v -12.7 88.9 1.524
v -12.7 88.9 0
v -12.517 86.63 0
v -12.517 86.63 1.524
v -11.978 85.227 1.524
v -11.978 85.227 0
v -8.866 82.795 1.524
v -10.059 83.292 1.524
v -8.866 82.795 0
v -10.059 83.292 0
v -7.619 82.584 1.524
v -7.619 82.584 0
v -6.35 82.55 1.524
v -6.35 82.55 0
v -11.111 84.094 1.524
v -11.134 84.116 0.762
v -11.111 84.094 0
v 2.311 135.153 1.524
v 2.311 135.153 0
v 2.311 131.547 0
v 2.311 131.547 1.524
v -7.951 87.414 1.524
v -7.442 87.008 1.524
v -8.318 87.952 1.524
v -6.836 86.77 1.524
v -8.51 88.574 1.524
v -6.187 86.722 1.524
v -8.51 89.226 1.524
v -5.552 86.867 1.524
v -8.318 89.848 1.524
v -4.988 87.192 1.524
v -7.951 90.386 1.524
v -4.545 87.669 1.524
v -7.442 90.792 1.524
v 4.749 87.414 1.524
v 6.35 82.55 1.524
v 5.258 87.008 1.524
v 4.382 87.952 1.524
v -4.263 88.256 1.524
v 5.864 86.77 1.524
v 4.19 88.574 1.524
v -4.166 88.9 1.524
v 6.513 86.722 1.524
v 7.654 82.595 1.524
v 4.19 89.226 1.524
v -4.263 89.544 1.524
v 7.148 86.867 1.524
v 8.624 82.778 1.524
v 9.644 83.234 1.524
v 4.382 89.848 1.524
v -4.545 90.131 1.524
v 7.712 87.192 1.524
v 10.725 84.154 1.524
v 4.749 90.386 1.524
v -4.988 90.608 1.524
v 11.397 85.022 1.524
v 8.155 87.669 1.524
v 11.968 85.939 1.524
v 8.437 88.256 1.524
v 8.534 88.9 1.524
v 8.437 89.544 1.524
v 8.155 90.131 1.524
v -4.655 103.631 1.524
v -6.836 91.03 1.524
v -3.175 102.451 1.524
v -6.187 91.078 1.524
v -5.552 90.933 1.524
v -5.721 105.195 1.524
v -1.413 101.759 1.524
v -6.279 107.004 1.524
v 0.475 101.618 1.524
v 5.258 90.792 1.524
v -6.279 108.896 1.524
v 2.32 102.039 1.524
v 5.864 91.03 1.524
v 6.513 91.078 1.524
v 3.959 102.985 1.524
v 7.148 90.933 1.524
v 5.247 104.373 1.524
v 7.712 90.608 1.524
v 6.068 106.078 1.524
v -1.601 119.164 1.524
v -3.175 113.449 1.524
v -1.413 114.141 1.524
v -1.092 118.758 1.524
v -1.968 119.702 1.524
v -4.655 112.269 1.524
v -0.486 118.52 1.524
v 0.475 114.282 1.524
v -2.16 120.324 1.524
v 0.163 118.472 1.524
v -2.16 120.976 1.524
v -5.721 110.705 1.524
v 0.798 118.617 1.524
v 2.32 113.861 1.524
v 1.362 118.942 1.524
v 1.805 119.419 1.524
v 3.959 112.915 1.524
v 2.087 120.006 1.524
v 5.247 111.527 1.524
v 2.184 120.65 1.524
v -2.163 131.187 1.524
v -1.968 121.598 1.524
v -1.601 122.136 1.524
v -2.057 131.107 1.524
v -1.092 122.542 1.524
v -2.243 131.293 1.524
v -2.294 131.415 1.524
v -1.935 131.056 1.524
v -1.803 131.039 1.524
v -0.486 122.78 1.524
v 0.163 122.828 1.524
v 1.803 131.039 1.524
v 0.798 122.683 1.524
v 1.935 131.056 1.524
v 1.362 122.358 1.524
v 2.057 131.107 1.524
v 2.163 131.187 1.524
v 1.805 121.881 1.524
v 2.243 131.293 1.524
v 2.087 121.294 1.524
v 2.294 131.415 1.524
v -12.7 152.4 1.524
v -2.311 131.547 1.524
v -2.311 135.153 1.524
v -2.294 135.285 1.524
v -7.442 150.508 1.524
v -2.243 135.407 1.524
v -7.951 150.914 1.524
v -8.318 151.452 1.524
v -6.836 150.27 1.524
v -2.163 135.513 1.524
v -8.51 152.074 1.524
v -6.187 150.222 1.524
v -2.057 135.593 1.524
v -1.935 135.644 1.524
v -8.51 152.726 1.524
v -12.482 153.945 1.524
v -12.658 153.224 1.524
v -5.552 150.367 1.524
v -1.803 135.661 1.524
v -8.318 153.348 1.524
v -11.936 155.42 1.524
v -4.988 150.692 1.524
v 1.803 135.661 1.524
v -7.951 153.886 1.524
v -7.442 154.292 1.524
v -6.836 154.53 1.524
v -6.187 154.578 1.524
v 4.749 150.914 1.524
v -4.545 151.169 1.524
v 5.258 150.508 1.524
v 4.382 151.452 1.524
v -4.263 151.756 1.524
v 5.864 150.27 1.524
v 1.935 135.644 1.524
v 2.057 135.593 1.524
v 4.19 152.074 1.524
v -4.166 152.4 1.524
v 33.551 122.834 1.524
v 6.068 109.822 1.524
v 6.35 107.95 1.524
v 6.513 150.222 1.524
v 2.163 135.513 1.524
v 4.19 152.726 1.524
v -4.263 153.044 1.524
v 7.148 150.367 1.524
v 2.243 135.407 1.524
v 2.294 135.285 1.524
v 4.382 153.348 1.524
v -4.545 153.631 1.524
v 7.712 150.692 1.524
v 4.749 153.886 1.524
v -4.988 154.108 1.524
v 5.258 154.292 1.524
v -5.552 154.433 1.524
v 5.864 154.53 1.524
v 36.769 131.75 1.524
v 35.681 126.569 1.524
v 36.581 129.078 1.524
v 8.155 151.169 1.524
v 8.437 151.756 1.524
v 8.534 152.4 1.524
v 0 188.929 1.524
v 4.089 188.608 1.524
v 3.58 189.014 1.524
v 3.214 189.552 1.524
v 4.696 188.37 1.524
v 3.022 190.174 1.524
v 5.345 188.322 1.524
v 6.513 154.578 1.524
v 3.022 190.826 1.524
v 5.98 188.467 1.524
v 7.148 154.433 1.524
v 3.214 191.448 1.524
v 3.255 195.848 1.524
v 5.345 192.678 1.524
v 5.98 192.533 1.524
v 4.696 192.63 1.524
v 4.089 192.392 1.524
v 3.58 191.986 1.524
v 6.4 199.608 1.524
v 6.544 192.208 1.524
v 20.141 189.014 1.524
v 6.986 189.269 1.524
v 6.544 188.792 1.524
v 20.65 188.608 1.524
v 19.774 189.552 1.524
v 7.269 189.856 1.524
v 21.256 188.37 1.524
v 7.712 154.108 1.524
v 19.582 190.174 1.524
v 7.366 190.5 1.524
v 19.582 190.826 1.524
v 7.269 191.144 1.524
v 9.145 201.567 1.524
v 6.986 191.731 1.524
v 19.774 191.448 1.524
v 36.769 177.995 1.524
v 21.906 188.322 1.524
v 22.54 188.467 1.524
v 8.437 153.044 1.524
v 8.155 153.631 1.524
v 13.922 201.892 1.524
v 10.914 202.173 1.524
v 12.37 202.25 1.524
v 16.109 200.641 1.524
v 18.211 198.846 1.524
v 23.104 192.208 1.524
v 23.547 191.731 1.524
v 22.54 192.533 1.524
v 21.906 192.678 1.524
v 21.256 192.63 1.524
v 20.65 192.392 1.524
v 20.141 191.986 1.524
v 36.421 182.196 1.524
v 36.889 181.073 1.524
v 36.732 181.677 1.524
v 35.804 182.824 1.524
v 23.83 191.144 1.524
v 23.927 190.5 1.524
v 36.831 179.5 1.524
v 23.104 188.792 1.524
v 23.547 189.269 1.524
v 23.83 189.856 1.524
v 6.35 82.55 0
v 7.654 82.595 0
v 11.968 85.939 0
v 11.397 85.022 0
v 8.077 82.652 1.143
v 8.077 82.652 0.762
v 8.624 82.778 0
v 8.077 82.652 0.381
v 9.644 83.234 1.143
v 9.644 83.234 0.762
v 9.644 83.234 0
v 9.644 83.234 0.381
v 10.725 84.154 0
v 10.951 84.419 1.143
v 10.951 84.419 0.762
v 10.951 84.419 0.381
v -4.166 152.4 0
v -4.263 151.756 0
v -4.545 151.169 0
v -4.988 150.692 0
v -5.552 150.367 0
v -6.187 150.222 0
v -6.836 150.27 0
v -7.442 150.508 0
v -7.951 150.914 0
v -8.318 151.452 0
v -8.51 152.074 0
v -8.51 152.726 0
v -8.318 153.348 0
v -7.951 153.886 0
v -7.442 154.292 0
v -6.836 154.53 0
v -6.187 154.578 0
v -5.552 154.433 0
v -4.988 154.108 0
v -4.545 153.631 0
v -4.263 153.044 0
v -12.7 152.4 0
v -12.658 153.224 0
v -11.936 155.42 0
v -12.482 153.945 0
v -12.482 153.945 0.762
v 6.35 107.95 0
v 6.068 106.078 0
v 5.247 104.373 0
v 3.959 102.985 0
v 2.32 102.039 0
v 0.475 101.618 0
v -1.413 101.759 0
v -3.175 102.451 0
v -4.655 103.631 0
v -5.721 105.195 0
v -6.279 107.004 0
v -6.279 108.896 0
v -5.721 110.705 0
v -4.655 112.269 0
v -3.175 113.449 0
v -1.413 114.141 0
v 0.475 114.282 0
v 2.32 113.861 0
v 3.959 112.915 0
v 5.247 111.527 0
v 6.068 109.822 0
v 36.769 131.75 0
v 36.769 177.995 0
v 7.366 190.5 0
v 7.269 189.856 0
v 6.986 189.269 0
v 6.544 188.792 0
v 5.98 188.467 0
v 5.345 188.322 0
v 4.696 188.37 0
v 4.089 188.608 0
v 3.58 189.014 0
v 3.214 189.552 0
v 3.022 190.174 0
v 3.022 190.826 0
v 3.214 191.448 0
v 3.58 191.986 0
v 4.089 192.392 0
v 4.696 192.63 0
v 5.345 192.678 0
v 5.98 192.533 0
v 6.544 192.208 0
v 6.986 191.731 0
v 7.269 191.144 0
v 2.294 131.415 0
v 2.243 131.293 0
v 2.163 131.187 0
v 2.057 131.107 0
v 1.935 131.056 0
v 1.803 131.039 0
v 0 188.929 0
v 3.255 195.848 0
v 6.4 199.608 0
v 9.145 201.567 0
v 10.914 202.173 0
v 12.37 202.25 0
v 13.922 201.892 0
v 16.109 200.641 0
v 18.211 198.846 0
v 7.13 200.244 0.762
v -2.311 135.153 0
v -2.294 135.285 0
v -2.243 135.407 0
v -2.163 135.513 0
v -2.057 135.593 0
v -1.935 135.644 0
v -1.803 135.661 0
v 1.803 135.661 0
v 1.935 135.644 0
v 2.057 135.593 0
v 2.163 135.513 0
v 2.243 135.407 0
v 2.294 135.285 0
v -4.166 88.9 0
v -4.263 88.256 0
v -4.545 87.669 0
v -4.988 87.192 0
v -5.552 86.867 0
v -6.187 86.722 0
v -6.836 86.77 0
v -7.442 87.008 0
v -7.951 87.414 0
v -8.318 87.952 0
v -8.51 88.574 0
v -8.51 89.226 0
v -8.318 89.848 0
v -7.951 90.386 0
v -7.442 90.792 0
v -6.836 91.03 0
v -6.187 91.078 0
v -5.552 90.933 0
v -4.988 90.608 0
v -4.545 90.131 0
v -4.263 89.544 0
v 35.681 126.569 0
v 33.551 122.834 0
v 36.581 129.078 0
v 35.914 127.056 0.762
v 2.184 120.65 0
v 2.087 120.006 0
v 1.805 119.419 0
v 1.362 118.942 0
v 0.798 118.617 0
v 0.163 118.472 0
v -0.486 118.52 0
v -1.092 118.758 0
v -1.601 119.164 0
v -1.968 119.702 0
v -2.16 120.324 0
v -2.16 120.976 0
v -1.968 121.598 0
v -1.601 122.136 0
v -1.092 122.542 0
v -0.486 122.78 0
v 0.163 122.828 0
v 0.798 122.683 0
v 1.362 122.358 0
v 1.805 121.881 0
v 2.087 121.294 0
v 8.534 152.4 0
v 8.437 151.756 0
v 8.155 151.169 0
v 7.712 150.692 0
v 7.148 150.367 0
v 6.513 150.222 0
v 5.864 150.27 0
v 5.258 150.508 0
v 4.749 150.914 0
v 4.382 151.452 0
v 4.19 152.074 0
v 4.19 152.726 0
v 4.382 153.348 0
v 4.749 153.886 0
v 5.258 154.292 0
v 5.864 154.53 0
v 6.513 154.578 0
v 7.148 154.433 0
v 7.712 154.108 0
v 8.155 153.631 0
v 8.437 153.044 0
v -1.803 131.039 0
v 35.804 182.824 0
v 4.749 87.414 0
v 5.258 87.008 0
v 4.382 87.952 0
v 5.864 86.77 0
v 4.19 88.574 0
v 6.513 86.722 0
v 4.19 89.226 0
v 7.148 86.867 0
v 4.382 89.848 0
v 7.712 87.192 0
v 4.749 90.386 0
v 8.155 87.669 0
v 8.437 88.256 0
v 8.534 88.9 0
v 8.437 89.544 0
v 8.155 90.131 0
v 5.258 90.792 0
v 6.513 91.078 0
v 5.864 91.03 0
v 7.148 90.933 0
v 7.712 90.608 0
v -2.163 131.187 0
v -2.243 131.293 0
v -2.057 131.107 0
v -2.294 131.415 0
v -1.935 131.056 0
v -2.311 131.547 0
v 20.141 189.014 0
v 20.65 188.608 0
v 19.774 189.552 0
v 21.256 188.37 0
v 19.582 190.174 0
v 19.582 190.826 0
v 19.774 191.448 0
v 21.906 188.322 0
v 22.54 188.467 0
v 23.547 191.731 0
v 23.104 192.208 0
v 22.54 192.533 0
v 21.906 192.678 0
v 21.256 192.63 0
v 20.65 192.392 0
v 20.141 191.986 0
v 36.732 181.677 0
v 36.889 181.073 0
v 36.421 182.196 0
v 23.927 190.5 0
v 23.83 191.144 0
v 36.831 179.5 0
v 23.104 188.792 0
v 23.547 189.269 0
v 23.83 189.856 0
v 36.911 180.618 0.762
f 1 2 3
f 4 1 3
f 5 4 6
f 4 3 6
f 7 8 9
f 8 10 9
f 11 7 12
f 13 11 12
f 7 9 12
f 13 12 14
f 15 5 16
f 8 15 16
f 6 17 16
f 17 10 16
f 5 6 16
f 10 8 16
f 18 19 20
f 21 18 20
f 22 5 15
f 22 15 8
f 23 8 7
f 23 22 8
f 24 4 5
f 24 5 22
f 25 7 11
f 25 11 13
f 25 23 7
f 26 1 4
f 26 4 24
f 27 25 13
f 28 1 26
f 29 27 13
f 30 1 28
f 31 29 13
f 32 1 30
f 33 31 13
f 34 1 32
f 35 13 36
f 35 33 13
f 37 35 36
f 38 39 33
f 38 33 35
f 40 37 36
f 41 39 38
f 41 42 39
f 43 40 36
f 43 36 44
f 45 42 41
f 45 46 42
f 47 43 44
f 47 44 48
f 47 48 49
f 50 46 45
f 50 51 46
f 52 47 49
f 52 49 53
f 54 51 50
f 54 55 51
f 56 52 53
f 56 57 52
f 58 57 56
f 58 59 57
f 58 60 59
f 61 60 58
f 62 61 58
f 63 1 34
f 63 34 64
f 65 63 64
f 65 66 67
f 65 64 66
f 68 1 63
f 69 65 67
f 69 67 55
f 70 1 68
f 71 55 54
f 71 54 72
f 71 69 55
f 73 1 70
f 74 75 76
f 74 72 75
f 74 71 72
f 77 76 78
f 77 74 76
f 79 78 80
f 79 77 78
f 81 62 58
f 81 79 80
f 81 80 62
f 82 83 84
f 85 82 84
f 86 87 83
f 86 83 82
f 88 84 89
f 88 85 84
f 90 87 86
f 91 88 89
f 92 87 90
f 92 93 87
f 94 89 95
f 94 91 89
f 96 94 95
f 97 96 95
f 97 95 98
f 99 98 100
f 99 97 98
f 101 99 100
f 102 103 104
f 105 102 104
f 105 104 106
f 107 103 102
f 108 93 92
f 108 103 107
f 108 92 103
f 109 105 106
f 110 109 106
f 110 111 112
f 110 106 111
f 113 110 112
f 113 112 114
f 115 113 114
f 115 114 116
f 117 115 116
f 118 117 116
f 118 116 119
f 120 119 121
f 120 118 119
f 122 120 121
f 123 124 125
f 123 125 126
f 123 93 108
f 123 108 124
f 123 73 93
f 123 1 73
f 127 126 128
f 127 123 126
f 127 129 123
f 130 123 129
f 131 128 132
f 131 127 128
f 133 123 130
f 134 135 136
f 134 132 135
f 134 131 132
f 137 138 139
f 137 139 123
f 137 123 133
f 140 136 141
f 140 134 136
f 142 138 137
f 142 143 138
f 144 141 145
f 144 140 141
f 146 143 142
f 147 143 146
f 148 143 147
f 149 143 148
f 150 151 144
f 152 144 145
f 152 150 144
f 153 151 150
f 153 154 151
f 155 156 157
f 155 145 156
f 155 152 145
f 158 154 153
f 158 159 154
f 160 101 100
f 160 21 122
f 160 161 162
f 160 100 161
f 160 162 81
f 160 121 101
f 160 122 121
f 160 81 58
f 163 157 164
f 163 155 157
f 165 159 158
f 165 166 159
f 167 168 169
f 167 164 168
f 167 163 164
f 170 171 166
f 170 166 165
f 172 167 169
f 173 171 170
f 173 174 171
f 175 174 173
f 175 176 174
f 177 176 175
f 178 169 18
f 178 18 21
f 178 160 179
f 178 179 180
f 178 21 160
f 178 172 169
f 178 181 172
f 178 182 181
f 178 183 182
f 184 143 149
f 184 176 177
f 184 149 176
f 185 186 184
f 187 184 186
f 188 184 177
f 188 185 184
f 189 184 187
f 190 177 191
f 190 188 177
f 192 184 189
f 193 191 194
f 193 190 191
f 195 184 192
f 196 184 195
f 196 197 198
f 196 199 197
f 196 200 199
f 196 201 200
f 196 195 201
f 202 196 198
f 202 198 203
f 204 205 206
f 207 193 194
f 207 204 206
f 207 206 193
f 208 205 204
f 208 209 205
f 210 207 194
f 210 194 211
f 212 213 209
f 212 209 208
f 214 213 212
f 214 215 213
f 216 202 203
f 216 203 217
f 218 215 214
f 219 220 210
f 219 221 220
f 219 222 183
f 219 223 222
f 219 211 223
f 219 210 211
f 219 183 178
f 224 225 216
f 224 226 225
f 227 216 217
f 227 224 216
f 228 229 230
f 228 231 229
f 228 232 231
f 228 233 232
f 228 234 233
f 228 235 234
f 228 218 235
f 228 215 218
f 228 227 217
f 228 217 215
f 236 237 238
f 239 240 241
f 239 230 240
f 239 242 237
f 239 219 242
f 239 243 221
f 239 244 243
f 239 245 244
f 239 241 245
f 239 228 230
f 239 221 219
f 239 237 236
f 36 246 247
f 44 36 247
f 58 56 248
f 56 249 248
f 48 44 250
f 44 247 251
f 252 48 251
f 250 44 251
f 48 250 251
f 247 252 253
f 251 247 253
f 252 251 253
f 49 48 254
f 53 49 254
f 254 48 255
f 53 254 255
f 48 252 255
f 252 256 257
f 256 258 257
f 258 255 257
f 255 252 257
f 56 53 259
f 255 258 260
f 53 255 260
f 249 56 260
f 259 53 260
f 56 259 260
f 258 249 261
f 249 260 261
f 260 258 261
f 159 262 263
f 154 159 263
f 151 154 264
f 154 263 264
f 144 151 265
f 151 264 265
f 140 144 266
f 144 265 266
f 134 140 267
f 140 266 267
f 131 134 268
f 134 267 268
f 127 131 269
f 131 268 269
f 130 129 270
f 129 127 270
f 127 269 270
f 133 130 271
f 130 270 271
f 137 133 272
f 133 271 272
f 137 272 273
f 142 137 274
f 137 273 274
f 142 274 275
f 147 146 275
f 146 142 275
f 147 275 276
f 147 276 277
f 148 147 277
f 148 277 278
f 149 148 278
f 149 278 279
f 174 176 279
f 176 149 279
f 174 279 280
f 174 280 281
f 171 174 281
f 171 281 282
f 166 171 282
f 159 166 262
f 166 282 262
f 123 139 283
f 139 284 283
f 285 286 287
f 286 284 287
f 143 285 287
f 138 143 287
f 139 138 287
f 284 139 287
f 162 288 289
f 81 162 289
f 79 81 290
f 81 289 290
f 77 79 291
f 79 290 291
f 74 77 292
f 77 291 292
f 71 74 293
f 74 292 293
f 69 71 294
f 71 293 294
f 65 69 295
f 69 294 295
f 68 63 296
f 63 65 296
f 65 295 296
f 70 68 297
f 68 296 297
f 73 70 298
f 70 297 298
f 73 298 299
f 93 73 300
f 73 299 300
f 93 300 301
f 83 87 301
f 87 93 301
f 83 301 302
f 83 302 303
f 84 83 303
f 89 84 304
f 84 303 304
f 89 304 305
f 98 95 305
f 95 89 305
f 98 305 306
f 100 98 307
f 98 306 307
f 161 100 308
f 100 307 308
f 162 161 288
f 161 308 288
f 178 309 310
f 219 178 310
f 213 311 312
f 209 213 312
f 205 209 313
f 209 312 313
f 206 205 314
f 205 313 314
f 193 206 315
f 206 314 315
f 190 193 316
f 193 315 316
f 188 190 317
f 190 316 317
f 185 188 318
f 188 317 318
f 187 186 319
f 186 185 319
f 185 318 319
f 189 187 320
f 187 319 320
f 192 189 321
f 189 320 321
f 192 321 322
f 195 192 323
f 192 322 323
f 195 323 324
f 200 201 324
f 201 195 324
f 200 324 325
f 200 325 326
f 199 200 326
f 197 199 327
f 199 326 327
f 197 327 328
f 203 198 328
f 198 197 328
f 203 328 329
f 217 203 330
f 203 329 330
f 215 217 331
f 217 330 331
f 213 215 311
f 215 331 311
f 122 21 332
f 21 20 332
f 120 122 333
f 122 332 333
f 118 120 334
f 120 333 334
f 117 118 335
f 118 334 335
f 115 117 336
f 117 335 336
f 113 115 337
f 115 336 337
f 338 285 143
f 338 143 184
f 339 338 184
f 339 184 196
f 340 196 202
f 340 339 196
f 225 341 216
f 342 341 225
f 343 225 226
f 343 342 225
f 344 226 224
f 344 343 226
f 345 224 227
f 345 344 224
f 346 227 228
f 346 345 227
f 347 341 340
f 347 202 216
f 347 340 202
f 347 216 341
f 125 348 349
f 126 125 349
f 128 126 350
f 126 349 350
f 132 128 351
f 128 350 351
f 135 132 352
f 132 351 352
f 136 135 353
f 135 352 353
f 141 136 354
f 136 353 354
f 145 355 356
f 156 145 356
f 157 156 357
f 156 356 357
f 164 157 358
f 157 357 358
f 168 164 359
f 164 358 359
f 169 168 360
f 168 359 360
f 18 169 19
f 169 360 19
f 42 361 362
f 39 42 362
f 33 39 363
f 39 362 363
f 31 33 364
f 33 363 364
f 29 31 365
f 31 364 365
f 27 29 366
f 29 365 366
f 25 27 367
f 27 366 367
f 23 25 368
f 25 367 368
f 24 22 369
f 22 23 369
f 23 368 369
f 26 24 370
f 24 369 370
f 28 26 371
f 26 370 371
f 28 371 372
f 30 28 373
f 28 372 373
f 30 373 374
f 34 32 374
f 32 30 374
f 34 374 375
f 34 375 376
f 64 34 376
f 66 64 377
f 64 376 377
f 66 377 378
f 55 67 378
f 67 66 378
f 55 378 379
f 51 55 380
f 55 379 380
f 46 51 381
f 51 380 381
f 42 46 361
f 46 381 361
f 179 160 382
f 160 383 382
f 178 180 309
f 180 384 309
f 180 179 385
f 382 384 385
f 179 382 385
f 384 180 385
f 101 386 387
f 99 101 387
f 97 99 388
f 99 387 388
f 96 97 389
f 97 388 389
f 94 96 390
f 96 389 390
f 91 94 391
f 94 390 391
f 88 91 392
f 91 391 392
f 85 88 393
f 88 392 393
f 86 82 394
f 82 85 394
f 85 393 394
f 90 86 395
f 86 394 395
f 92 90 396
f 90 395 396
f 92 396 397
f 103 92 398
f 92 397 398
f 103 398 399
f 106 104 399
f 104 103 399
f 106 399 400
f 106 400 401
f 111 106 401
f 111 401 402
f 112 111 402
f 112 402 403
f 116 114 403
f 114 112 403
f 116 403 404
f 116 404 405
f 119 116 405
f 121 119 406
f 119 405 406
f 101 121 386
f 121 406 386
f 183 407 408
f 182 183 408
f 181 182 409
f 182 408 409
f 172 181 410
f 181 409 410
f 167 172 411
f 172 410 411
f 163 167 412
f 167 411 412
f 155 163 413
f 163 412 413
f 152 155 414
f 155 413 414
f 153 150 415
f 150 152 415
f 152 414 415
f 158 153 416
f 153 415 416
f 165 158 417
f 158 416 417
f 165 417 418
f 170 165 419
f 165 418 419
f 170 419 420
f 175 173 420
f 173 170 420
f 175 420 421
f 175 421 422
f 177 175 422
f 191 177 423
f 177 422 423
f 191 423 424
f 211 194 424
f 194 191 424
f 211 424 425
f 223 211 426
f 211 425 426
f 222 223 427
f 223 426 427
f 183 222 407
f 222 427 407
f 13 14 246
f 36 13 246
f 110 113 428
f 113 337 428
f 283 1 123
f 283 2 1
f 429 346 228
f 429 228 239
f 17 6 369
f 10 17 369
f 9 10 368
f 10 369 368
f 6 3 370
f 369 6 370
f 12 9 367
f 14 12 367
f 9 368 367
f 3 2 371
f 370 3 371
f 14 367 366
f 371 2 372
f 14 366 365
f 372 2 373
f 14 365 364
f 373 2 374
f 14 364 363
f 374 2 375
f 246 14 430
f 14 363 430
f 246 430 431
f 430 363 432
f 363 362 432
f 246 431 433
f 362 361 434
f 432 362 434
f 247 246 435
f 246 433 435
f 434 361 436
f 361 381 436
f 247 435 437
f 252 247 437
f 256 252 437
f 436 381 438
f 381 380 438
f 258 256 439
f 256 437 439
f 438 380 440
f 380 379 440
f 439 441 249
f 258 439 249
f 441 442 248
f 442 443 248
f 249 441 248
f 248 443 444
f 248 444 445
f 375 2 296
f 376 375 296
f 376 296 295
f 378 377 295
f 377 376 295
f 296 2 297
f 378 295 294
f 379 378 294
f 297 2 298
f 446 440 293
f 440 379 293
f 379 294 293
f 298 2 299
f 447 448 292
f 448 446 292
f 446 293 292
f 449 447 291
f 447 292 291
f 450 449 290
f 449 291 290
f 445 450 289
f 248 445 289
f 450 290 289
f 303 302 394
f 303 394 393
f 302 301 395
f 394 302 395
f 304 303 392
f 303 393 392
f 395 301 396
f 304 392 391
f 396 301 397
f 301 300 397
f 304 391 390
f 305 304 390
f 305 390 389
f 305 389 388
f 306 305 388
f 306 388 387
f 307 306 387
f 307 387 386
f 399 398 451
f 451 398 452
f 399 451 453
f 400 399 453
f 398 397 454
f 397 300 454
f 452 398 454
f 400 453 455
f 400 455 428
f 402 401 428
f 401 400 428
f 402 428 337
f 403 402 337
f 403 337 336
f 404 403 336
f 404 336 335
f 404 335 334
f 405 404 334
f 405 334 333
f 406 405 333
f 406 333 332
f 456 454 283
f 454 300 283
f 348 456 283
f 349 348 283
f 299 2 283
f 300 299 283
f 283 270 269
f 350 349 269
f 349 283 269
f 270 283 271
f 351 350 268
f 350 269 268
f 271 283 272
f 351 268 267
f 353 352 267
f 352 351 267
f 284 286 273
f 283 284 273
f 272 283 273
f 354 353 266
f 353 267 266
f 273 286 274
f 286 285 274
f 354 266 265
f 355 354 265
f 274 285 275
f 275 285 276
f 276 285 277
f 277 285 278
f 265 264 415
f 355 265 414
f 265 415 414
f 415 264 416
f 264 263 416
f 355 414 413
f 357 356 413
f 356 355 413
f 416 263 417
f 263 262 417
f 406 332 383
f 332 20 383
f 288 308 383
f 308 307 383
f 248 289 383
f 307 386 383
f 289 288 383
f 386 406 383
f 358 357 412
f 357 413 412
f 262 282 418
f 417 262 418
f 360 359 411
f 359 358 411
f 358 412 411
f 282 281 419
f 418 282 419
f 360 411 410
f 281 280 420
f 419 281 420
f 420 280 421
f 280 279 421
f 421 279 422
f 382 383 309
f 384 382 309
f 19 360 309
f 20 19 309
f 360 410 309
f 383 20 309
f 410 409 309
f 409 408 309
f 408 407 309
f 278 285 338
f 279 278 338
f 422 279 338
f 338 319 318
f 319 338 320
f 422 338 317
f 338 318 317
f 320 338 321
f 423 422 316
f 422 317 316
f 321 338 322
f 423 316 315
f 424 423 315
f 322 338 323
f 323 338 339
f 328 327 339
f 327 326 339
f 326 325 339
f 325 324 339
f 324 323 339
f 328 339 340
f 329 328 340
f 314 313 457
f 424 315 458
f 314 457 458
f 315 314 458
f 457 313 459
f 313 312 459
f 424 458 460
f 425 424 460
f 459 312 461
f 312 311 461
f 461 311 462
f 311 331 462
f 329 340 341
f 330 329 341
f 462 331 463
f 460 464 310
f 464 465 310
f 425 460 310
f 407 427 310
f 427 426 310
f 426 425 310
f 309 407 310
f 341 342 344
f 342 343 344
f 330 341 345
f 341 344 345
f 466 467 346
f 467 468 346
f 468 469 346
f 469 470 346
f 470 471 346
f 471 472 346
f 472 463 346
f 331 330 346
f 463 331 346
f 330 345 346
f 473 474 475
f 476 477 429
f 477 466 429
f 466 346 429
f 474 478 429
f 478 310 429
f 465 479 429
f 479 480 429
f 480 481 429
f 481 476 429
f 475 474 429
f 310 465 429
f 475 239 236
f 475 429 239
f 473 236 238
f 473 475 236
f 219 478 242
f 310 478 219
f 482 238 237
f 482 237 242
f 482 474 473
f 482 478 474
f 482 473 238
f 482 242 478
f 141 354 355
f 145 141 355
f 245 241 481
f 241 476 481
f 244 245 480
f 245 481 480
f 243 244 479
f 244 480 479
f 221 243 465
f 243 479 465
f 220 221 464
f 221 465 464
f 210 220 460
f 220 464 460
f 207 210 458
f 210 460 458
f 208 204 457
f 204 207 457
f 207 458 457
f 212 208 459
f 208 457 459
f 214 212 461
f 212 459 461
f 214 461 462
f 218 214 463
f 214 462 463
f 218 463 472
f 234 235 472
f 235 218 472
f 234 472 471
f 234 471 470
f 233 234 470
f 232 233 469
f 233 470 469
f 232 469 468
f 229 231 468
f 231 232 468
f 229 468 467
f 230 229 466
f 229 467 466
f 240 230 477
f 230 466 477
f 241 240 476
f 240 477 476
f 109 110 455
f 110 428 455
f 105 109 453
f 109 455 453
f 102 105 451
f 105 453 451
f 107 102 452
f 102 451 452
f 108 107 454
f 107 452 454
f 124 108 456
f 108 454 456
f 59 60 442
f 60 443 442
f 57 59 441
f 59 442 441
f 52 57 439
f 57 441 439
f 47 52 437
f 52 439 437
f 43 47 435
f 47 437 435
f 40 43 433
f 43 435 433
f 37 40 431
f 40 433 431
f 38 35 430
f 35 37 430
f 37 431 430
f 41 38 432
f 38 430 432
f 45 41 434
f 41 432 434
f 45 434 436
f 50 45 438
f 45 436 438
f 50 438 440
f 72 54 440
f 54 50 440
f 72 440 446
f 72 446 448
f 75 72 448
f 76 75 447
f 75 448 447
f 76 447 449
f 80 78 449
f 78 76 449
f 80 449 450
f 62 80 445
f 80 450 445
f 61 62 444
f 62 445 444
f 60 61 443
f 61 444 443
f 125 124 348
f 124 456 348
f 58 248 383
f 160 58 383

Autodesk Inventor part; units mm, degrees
ref_plane "YZ Plane" through (0, 0, 0) normal (1, 0, 0) x (0, 1, 0)
ref_plane "XZ Plane" through (0, 0, 0) normal (0, 1, 0) x (-1, 0, 0)
ref_plane "XY Plane" through (0, 0, 0) normal (0, 0, 1) x (1, 0, 0)
sketch "Sketch1" plane through (0, 0, 0) normal (0, 0, 1) x (1, 0, 0)
  circle A0 centre (-6.35, 152.4) radius 2.1844
  circle A1 centre (6.35, 152.4) radius 2.1844
  circle A2 centre (-6.35, 88.9) radius 2.1844
  circle A3 centre (6.35, 88.9) radius 2.1844
  arc A4 (-1.8034, 135.6614) -> (-2.3114, 135.1534) centre (-1.8034, 135.1534) ccw
  line L0 (-2.3114, 131.5466) -> (-2.3114, 135.1534)
  line L1 (-1.8034, 135.6614) -> (1.8034, 135.6614)
  arc A5 (-2.3114, 131.5466) -> (-1.8034, 131.0386) centre (-1.8034, 131.5466) ccw
  line L2 (1.8034, 131.0386) -> (-1.8034, 131.0386)
  arc A6 (1.8034, 131.0386) -> (2.3114, 131.5466) centre (1.8034, 131.5466) ccw
  line L3 (2.3114, 135.1534) -> (2.3114, 131.5466)
  arc A7 (2.3114, 135.1534) -> (1.8034, 135.6614) centre (1.8034, 135.1534) ccw
  circle A8 centre (0, 120.65) radius 2.1844
  circle A9 centre (0, 107.95) radius 6.35
  line L4 (36.7693, 131.7499) -> (36.7693, 177.9954)
  line L5 (-12.7, 88.9) -> (-12.7, 152.4)
  line L6 (-6.35, 82.55) -> (6.35, 82.55)
  spline S0 degree 4 poles (-12.7, 88.9) (-12.7, 87.6131) (-12.7, 85.0392) (-10.2108, 82.55) (-7.6369, 82.55) (-6.35, 82.55) knots 0 0 0 0 0 0.5 1 1 1 1 1
  spline S1 degree 4 poles (6.35, 82.55) (8.1081, 82.55) (9.8661, 82.55) (11.0889, 84.4373) (11.9675, 85.9392) knots 0 0 0 0 0 1 1 1 1 1
  line L7 (11.9675, 85.9392) -> (33.5511, 122.8344)
  spline S2 degree 4 poles (33.5511, 122.8344) (34.1544, 123.8656) (35.3609, 125.928) (36.7693, 128.0899) (36.7693, 130.5299) (36.7693, 131.7499) knots 0 0 0 0 0 0.5 1 1 1 1 1
  spline S3 degree 4 poles (-11.9358, 155.4201) (-12.0668, 155.0524) (-12.3287, 154.3171) (-12.7, 153.5861) (-12.7, 152.7954) (-12.7, 152.4) knots 0 0 0 0 0 0.5 1 1 1 1 1
  line L8 (-11.9358, 155.4201) -> (0, 188.9294)
  line L9 (18.2111, 198.8461) -> (35.8036, 182.8241)
  spline S4 degree 4 poles (0, 188.9294) (0.9805, 191.6822) (2.9416, 197.1879) (10.5283, 205.8431) (15.6502, 201.1784) (18.2111, 198.8461) knots 0 0 0 0 0 0.5 1 1 1 1 1
  spline S5 degree 4 poles (35.8036, 182.8241) (36.303, 182.3693) (37.3018, 181.4596) (36.7693, 179.86) (36.7693, 178.6169) (36.7693, 177.9954) knots 0 0 0 0 0 0.5 1 1 1 1 1
  circle A10 centre (21.7424, 190.5) radius 2.1844
  circle A11 centre (5.1816, 190.5) radius 2.1844
  point P0 (0, 0)
  point P1 (21.7424, 177.8)
  point P2 (14.224, 190.5)
  dimension "d1" = 4.3688
  dimension "d2" = 12.7
  dimension "d10" = 0
  dimension "d13" = 16.5608
  dimension "d16" = 12.7
  dimension "d17" = 7.5184
extrude "Extrusion1" add sketch "Sketch1" along normal blind 1.524
sketch "Sketch2" plane through (0, 0, 1.524) normal (0, 0, 1) x (1, 0, 0)
  line L0 (12.9318, 114.6329) -> (12.9318, 139.693) construction
  line L1 (12.9318, 139.693) -> (20.9407, 139.693) construction
  line L2 (20.9407, 139.693) -> (20.9407, 114.6329) construction
  line L3 (20.9407, 114.6329) -> (12.9318, 114.6329) construction
  line L4 (-6.35, 82.55) -> (6.35, 82.55) projected
  line L5 (11.9675, 85.9392) -> (33.5511, 122.8344) projected
  line L6 (36.7693, 131.7499) -> (36.7693, 177.9954) projected
  line L7 (35.8036, 182.8241) -> (18.2111, 198.8461) projected
  line L8 (0, 188.9294) -> (-11.9358, 155.4201) projected
  line L9 (-12.7, 152.4) -> (-12.7, 88.9) projected
  circle A0 centre (-6.35, 152.4) radius 2.1844 projected
  circle A1 centre (6.35, 152.4) radius 2.1844 projected
  circle A2 centre (6.35, 88.9) radius 2.1844 projected
  circle A3 centre (0, 120.65) radius 2.1844 projected
  circle A4 centre (0, 107.95) radius 6.35 projected
  circle A5 centre (21.7424, 190.5) radius 2.1844 projected
  circle A6 centre (5.1816, 190.5) radius 2.1844 projected
  line L10 (2.3114, 135.1534) -> (2.3114, 131.5466) projected
  arc A7 (1.8034, 131.0386) -> (2.3114, 131.5466) centre (1.8034, 131.5466) ccw projected
  line L11 (1.8034, 131.0386) -> (-1.8034, 131.0386) projected
  arc A8 (-2.3114, 131.5466) -> (-1.8034, 131.0386) centre (-1.8034, 131.5466) ccw projected
  line L12 (-2.3114, 131.5466) -> (-2.3114, 135.1534) projected
  arc A9 (-1.8034, 135.6614) -> (-2.3114, 135.1534) centre (-1.8034, 135.1534) ccw projected
  line L13 (-1.8034, 135.6614) -> (1.8034, 135.6614) projected
  arc A10 (2.3114, 135.1534) -> (1.8034, 135.6614) centre (1.8034, 135.1534) ccw projected
  circle A11 centre (-6.35, 88.9) radius 2.1844 projected
  point P0 (0, 0)
properties part number "sled"
